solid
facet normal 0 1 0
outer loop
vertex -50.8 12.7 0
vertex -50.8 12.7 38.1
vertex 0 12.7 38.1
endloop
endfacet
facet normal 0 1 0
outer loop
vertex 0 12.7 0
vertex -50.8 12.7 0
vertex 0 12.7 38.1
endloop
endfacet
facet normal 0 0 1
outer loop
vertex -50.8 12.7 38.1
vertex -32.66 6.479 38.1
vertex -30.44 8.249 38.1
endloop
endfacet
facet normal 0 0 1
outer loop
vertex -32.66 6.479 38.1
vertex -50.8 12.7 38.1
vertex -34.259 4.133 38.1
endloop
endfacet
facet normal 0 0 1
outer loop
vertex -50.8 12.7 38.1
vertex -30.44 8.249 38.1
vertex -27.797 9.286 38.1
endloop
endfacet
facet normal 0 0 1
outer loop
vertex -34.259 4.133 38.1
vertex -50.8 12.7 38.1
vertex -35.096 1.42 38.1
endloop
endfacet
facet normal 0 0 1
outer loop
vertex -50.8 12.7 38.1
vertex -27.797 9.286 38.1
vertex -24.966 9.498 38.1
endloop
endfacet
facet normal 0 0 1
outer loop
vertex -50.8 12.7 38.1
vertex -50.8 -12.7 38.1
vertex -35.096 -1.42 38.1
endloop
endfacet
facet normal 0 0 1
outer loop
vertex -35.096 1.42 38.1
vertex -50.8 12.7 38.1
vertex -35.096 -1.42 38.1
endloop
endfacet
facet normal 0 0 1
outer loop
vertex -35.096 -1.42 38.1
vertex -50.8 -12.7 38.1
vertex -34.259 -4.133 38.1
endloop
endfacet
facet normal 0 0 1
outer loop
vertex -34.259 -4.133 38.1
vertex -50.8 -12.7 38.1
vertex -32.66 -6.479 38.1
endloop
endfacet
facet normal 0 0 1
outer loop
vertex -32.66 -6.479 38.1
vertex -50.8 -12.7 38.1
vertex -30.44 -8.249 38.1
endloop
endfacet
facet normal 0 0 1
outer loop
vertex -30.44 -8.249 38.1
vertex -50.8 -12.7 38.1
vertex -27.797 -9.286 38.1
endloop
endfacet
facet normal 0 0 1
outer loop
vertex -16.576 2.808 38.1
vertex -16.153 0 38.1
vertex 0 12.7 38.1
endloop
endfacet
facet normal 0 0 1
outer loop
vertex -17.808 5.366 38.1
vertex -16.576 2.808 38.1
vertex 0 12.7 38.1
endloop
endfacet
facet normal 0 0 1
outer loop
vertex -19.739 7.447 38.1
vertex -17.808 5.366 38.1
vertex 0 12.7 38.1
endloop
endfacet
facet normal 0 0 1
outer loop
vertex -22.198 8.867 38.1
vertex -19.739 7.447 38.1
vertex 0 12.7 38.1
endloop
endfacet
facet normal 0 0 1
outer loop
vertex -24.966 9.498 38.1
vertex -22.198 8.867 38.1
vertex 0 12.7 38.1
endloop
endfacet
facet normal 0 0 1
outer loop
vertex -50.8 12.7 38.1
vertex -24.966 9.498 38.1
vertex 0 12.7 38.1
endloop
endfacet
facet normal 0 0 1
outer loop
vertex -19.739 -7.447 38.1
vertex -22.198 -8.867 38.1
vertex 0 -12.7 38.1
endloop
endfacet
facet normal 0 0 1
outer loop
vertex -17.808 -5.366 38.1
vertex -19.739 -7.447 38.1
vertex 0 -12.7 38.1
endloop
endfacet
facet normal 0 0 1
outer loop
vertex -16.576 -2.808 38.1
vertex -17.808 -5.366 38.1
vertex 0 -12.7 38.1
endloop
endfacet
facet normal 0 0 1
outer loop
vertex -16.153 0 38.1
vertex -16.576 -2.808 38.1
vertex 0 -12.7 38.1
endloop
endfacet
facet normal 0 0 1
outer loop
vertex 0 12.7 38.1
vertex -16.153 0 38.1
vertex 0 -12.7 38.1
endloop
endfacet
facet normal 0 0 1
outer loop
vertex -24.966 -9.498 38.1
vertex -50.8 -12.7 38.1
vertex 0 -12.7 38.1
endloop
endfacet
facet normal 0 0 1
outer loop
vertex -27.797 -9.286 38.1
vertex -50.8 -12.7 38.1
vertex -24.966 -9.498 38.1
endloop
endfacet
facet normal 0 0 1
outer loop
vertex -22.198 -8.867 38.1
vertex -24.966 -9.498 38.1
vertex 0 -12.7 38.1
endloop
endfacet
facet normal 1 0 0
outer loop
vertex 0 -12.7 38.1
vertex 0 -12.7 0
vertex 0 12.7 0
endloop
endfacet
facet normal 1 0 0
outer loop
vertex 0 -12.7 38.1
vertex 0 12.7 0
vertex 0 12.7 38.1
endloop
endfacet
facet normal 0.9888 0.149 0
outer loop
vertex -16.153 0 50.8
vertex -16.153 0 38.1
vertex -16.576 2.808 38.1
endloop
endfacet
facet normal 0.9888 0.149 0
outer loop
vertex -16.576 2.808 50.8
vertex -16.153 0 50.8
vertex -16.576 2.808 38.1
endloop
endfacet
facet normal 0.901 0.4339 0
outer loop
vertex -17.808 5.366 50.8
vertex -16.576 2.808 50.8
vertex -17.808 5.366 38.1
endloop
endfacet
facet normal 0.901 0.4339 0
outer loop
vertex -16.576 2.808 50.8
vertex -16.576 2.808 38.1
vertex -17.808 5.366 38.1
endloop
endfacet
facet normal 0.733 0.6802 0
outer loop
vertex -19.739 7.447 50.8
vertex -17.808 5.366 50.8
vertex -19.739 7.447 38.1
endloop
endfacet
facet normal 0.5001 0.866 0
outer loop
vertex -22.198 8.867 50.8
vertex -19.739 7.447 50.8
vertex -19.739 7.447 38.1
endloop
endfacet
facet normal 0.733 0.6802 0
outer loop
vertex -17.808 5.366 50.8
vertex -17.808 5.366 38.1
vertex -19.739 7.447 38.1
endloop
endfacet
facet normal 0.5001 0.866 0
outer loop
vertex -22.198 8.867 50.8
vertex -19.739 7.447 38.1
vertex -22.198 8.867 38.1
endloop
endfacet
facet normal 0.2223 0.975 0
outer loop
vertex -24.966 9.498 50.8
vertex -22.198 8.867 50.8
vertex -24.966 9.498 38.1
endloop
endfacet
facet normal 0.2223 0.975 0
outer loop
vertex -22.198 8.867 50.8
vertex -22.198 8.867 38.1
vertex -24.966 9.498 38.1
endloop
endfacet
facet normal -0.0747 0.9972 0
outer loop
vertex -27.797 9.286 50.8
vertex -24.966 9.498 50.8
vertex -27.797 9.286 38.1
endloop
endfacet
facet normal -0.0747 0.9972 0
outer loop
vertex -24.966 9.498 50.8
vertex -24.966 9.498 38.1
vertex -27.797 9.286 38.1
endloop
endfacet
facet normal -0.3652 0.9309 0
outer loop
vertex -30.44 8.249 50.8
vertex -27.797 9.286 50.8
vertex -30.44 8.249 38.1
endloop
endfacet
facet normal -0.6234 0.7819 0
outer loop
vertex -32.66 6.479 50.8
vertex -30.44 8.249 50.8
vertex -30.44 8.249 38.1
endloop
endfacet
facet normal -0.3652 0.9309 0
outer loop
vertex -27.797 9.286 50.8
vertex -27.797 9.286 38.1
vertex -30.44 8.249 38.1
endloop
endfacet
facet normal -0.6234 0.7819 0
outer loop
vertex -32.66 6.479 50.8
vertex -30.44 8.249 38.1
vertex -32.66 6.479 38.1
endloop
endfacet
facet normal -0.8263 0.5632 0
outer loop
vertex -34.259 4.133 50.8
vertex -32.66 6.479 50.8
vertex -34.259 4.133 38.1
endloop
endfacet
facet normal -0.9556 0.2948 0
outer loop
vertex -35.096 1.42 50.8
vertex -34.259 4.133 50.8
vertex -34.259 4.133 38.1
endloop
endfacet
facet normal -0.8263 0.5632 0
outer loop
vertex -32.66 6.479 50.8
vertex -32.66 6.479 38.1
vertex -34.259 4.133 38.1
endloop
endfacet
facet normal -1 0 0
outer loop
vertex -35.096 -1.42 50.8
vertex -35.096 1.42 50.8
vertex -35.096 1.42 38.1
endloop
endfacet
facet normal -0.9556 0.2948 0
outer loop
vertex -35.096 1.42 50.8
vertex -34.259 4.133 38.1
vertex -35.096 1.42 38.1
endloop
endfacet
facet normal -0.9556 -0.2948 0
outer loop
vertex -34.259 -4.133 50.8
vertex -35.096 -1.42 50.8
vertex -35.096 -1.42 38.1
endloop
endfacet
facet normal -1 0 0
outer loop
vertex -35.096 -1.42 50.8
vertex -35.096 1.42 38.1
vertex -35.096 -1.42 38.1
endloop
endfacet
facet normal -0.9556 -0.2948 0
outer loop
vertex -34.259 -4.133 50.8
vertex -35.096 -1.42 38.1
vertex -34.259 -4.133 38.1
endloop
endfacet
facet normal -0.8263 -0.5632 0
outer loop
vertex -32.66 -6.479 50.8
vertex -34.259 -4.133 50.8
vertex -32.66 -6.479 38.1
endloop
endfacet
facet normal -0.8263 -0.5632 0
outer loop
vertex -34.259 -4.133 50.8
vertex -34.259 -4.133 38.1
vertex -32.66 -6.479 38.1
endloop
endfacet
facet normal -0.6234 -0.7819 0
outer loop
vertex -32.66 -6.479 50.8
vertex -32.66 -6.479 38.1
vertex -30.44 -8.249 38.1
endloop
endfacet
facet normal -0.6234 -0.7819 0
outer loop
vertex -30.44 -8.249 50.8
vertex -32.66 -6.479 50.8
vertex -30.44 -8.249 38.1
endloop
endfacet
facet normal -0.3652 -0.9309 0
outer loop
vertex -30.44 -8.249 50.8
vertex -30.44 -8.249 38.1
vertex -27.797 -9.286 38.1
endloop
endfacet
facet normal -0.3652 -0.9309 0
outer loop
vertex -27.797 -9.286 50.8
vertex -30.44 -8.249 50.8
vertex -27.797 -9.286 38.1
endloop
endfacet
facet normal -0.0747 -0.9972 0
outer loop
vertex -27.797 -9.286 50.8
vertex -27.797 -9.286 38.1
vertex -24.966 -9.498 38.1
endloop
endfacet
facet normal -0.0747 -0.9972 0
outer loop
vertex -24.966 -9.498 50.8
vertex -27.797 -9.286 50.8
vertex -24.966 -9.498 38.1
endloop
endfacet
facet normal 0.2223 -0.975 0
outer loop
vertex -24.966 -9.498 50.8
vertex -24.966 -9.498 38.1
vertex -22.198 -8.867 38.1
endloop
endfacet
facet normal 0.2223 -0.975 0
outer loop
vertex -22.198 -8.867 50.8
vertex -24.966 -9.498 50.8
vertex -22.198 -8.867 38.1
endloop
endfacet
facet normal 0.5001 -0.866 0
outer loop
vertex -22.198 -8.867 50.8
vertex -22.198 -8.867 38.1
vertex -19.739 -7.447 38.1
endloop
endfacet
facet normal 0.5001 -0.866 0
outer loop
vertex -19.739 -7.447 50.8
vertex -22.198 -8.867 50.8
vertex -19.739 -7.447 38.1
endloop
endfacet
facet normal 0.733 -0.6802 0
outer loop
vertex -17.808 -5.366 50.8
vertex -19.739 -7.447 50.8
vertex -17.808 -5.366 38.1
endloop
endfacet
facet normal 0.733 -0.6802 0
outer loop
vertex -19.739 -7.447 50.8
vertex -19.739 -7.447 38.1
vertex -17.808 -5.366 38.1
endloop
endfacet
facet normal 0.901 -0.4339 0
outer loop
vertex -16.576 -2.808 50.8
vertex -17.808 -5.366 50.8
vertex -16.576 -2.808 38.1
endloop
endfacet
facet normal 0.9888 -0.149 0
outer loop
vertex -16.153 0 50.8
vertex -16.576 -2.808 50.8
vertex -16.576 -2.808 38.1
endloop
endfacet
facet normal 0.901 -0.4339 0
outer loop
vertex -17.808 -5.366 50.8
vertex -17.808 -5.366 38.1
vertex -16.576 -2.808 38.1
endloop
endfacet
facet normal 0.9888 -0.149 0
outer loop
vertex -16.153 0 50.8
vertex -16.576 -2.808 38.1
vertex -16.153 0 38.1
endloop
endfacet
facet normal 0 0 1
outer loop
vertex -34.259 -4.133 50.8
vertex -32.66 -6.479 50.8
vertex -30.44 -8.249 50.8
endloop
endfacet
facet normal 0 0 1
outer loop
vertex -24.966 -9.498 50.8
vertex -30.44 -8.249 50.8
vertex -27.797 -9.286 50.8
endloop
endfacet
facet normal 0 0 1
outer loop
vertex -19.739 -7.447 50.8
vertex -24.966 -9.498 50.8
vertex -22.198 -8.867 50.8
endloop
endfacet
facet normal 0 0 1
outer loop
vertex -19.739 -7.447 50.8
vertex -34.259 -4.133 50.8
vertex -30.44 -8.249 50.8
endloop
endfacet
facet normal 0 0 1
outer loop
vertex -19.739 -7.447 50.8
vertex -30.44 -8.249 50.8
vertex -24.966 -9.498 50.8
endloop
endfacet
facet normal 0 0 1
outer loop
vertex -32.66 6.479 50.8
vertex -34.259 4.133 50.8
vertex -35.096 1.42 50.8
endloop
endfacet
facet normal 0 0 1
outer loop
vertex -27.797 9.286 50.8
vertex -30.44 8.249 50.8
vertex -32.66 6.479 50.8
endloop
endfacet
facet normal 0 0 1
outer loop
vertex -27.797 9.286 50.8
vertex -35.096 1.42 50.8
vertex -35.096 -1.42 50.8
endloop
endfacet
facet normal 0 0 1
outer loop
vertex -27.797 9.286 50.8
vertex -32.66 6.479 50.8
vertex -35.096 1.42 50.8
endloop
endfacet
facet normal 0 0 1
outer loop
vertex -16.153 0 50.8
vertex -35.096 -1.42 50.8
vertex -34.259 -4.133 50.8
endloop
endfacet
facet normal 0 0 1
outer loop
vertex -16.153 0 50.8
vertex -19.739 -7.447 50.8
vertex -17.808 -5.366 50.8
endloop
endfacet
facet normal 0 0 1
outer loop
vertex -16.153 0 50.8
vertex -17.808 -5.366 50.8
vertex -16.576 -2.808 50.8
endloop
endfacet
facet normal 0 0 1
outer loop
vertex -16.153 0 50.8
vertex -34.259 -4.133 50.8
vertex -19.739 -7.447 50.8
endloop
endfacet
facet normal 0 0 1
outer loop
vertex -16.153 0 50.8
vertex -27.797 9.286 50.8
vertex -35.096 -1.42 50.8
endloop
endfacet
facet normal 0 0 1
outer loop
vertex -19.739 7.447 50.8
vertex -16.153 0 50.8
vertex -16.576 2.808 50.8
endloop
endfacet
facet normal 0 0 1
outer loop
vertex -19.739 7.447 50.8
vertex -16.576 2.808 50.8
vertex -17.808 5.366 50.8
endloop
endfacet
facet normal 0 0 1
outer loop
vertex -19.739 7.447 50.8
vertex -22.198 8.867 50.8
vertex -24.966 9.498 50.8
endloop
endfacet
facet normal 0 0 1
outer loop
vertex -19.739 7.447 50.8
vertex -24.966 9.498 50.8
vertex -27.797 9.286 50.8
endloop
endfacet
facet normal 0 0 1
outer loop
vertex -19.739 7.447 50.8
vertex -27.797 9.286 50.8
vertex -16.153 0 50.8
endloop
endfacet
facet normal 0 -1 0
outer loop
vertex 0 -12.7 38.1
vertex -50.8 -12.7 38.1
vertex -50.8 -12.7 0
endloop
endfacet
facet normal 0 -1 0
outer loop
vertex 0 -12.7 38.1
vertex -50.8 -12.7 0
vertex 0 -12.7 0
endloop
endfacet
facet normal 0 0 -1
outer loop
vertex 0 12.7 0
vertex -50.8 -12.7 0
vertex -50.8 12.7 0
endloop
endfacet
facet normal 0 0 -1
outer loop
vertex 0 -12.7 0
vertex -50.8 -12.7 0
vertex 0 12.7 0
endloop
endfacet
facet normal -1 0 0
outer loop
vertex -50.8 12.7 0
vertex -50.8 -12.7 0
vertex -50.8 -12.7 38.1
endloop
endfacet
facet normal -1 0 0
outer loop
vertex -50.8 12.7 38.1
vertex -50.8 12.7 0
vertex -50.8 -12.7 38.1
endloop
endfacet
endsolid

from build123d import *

# Parameters (mm, degrees)
F0_W     = 50.8
F0_H     = 38.1
F1_DEPTH = 12.7
F2_R     = 9.525
F3_DEPTH = 12.7


with BuildPart() as f1:
    # F0 (on Front) → F1 (new body, symmetric)
    with BuildSketch(Plane.XZ):
        with Locations((-25.4, 19.05)):
            Rectangle(F0_W, F0_H)
    extrude(amount=F1_DEPTH, both=True)

    # F2 (on face) → F3 (join)
    with BuildSketch(Plane.XY.offset(38.1)):
        with Locations((-25.677594, 0)):
            Circle(F2_R)
    extrude(amount=F3_DEPTH)


solid = f1.part
